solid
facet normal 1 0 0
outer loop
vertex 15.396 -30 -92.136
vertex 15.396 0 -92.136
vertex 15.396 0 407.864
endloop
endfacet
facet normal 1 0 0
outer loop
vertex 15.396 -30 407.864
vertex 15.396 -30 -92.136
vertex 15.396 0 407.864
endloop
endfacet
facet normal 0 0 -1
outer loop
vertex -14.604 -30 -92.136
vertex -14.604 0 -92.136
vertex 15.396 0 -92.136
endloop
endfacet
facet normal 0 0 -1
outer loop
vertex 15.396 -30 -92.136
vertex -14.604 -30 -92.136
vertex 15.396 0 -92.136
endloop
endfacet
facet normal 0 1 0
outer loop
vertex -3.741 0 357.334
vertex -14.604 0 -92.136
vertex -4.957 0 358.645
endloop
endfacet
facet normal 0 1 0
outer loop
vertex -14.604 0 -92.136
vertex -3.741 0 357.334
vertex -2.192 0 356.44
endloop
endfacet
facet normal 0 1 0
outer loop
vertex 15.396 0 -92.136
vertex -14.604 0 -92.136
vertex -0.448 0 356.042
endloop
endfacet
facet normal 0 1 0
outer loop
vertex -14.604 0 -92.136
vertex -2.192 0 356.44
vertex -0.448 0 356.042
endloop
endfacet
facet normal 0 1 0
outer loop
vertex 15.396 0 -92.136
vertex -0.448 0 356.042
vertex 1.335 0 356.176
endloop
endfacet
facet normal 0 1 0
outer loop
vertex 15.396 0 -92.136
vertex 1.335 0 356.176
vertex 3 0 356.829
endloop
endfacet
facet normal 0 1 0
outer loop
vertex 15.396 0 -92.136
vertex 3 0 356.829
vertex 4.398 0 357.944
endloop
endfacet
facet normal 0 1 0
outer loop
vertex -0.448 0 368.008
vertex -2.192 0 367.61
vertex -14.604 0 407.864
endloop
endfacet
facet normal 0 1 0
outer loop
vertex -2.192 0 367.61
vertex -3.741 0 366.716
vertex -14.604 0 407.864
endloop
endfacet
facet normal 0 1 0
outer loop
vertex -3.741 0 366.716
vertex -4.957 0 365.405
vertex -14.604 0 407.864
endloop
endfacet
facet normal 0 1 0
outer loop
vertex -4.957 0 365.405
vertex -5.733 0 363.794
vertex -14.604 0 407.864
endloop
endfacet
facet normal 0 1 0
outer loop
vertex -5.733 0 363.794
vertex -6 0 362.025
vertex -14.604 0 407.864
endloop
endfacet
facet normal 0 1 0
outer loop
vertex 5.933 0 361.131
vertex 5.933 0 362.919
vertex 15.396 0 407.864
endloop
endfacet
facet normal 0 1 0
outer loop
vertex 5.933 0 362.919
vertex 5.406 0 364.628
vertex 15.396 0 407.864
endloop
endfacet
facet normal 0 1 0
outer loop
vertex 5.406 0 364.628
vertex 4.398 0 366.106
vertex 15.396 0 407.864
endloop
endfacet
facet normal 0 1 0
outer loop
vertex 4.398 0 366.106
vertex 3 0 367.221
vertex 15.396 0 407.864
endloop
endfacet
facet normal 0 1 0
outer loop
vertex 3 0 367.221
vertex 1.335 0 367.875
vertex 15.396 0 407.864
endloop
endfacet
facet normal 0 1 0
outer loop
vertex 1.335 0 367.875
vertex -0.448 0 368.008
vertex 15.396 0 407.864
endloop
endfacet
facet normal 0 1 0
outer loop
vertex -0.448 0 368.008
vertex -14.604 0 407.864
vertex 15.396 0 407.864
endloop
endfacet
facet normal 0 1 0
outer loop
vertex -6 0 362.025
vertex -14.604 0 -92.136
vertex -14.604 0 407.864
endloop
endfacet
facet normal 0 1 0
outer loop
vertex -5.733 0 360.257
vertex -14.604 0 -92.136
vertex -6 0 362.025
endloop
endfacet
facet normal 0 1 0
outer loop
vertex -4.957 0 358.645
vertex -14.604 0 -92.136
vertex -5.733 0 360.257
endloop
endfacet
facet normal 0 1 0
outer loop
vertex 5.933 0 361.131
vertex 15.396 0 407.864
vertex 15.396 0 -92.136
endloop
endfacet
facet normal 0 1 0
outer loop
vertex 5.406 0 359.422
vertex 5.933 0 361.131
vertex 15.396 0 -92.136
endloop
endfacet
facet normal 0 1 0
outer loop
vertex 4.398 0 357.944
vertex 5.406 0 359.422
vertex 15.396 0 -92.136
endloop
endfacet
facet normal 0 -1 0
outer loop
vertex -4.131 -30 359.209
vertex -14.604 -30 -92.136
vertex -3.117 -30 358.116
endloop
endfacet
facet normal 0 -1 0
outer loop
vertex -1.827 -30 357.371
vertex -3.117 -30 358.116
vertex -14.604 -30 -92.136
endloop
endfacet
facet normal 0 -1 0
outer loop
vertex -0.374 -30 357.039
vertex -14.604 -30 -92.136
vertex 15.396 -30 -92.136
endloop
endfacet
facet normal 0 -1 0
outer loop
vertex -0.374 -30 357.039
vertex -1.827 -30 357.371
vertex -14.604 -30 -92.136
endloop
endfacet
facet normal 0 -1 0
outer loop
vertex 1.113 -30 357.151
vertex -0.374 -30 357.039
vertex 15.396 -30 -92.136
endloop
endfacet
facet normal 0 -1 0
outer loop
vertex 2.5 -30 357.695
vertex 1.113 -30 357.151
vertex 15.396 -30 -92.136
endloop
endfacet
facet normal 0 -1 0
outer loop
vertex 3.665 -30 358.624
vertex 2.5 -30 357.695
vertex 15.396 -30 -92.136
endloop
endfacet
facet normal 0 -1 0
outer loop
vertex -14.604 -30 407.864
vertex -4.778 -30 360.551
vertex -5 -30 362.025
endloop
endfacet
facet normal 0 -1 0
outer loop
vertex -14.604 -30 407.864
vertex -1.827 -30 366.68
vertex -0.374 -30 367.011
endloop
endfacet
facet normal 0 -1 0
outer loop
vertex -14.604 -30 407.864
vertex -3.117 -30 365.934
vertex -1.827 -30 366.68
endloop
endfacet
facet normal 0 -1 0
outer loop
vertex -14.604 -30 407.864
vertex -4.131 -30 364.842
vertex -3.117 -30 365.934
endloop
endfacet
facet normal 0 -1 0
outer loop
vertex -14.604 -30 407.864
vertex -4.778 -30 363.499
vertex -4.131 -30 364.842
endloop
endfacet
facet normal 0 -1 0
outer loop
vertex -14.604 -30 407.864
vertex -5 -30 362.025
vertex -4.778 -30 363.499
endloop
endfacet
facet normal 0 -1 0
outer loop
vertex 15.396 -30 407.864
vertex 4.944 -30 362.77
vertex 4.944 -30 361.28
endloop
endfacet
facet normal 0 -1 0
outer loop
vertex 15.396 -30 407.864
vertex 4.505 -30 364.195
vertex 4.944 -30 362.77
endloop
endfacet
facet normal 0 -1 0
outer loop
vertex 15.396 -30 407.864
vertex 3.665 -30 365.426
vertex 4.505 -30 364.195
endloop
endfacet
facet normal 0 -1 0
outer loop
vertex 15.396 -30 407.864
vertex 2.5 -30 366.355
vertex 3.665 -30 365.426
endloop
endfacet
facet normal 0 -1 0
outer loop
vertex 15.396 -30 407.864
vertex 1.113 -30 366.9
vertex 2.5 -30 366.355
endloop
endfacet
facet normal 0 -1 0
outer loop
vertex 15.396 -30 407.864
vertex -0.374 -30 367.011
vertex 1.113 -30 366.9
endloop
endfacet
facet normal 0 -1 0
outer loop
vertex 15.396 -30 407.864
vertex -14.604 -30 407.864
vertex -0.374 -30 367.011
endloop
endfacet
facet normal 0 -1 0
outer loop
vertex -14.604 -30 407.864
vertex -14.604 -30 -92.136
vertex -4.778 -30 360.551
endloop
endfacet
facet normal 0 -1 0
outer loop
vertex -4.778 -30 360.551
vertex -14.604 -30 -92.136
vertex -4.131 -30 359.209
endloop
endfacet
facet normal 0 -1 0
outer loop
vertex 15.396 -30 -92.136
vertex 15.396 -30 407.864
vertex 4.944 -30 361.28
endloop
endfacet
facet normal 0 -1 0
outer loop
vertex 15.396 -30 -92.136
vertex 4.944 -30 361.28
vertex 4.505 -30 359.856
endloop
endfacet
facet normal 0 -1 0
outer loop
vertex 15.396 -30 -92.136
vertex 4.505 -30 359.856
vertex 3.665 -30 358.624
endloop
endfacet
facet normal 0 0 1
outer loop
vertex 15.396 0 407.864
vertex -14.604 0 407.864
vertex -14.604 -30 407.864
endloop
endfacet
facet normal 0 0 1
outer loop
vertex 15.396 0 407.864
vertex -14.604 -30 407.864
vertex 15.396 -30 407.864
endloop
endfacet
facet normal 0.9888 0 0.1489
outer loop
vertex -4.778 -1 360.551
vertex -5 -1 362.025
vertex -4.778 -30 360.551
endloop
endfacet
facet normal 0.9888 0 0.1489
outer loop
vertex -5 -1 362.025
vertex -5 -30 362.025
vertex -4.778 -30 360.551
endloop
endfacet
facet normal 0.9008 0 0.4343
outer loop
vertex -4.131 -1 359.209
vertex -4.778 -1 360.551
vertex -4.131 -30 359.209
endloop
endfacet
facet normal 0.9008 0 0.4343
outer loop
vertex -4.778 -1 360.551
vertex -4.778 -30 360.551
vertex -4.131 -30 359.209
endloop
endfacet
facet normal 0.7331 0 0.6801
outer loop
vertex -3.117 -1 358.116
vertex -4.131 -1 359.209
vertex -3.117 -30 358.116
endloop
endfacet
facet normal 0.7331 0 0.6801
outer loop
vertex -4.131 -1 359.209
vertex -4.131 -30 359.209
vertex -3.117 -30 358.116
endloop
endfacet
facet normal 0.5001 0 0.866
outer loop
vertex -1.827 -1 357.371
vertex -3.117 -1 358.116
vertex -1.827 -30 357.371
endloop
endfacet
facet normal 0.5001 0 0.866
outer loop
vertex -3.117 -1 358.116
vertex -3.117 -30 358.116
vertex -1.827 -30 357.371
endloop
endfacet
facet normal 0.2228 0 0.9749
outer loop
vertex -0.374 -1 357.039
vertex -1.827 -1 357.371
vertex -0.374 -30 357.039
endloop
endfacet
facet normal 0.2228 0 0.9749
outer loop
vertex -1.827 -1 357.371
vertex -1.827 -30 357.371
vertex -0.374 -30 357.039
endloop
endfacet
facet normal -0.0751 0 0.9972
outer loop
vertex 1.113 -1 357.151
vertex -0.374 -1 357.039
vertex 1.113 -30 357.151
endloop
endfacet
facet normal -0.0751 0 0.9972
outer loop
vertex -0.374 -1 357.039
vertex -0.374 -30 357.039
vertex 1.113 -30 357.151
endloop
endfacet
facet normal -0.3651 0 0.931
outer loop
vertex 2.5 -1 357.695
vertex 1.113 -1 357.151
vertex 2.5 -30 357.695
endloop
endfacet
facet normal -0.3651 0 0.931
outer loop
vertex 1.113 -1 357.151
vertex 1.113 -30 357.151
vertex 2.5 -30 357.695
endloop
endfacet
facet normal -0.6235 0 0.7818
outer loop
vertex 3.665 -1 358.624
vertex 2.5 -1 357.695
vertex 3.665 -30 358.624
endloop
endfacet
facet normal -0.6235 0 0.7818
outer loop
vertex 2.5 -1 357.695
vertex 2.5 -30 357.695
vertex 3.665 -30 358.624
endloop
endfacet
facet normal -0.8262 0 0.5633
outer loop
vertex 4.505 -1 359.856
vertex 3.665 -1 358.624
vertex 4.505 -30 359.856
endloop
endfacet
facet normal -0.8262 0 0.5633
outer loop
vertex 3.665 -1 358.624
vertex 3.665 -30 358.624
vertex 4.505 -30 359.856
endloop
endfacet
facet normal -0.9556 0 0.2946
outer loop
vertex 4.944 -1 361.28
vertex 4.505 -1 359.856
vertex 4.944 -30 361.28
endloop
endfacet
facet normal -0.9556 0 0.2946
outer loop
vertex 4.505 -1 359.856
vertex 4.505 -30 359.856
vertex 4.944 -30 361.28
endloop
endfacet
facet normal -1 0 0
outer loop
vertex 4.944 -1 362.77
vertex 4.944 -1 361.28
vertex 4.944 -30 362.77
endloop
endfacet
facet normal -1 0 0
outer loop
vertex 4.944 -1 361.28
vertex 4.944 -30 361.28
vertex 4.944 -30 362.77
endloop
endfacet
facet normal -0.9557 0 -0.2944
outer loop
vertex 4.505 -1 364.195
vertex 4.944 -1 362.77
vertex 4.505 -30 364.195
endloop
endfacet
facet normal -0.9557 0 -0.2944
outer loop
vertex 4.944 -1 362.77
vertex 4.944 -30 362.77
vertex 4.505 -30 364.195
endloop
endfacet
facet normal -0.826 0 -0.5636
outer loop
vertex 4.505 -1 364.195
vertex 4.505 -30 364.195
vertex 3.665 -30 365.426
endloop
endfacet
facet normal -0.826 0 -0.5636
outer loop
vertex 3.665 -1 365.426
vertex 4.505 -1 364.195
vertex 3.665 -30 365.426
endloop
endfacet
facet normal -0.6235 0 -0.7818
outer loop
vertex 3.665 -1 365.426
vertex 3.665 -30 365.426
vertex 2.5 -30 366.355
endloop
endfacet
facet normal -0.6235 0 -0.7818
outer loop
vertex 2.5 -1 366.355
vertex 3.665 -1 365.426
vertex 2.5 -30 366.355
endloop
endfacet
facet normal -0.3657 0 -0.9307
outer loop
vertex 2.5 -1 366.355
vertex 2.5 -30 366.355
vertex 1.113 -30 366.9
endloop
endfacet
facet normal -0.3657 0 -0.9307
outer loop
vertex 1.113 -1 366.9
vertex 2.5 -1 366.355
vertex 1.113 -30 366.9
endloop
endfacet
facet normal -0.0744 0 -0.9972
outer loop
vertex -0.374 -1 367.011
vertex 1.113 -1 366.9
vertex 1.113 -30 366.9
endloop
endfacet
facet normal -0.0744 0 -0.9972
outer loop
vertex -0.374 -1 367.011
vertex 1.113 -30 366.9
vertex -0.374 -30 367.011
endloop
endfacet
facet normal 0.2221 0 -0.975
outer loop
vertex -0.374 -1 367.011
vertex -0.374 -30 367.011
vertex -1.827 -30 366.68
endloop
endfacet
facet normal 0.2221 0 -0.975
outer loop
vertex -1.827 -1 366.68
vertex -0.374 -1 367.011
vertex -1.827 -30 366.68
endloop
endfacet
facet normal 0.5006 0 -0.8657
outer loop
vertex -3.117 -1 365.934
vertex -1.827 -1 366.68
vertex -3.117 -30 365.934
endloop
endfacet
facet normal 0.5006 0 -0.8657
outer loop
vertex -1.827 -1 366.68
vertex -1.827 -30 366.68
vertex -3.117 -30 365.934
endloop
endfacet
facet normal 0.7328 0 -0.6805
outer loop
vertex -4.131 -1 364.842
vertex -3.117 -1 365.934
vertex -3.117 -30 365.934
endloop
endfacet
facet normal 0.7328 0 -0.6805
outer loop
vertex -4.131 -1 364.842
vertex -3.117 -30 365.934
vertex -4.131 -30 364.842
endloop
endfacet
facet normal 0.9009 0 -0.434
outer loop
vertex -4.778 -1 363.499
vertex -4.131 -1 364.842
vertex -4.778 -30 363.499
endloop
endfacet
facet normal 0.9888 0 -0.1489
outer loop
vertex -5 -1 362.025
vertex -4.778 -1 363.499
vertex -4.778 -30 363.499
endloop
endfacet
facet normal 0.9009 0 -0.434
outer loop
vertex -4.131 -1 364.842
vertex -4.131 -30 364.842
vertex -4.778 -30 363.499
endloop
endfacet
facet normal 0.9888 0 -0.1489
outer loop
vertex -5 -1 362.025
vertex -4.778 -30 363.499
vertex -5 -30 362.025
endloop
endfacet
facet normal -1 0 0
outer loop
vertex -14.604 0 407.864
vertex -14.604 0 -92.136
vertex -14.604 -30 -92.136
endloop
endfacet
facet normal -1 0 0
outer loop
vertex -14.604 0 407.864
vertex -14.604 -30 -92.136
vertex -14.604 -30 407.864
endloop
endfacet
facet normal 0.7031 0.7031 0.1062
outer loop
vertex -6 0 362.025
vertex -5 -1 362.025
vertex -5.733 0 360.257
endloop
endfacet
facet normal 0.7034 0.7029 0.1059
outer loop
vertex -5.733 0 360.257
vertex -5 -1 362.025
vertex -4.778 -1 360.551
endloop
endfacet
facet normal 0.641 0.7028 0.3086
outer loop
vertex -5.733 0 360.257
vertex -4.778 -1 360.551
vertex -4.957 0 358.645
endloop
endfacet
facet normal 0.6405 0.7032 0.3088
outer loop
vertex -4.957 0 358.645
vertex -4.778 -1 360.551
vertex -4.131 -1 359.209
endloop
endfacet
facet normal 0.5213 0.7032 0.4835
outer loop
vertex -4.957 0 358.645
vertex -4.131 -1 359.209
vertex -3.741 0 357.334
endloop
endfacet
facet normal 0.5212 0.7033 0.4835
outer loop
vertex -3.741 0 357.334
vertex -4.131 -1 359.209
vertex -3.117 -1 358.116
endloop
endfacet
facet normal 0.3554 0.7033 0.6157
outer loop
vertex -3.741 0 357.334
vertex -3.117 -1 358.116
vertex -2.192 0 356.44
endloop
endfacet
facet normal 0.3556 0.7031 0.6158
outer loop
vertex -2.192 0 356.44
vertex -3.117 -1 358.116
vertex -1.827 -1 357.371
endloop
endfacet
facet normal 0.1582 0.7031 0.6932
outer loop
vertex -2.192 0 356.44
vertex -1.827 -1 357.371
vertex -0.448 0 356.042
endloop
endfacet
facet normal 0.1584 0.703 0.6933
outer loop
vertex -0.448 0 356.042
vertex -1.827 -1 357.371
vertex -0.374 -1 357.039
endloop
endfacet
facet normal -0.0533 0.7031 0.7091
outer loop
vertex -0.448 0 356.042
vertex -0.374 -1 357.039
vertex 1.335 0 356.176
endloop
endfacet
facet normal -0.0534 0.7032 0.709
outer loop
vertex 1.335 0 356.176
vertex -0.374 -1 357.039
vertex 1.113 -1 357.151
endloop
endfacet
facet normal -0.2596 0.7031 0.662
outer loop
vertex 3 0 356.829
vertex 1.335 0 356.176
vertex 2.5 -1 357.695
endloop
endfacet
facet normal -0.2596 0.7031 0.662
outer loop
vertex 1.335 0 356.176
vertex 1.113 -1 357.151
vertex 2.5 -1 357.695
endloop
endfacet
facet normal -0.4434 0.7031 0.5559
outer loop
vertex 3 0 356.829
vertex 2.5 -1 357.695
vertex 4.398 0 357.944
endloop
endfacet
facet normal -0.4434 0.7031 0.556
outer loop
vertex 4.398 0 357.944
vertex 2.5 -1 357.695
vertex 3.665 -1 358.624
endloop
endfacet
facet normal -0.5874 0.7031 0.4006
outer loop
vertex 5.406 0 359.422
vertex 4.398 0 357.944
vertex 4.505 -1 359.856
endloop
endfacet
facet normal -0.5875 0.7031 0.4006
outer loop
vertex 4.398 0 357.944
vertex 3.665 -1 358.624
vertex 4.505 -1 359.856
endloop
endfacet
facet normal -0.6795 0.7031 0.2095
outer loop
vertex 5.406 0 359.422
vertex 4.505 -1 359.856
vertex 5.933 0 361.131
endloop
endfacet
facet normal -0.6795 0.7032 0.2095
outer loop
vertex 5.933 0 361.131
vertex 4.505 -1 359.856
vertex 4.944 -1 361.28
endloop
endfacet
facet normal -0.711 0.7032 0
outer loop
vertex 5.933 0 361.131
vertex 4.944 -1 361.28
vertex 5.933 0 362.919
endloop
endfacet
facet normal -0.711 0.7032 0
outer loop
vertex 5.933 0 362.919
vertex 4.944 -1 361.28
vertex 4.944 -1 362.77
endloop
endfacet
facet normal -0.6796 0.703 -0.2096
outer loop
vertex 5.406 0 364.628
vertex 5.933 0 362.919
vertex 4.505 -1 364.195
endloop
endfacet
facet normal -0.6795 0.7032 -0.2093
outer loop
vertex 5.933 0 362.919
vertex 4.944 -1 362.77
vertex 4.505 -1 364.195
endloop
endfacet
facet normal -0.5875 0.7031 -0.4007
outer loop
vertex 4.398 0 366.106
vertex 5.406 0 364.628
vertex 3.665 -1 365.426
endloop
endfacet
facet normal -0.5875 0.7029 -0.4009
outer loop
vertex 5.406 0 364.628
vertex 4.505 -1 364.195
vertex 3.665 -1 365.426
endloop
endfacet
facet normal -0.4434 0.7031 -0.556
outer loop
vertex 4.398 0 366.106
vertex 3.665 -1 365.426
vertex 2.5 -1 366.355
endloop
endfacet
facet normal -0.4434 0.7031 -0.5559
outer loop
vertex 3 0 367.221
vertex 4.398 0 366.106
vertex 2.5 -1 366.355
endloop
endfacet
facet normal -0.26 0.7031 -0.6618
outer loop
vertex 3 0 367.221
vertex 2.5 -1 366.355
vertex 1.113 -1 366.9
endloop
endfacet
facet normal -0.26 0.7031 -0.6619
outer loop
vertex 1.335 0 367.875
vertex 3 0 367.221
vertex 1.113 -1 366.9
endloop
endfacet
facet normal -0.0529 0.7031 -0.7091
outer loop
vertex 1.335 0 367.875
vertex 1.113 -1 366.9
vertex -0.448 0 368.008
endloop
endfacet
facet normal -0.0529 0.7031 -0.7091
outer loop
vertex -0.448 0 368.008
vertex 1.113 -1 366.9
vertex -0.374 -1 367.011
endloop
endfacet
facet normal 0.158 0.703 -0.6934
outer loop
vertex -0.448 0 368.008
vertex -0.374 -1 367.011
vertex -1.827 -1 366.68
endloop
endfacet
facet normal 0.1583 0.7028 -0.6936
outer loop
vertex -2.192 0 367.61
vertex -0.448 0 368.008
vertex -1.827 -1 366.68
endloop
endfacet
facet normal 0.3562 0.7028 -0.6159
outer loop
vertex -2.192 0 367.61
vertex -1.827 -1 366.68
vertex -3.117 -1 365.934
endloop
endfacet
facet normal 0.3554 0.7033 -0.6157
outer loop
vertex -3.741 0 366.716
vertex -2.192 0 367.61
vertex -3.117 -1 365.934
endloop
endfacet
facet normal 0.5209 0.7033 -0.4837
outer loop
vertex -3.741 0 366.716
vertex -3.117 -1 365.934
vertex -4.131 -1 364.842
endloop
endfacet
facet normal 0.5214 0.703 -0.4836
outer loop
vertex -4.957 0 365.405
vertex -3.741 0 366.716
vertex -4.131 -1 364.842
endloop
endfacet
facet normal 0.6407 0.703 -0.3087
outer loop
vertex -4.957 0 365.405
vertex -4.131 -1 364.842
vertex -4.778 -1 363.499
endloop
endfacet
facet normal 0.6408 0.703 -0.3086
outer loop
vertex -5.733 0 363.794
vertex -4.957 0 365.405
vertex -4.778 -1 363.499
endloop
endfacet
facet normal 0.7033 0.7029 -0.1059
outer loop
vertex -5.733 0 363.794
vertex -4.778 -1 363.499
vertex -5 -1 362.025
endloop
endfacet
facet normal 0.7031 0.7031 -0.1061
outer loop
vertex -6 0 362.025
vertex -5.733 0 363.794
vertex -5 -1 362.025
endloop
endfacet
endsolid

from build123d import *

# Parameters (mm, degrees)
F0_W           = 30
F0_H           = 500
F1_DEPTH       = 30
F2_D           = 10
F2_CSINK_D     = 12
F2_CSINK_ANGLE = 90


with BuildPart() as f1:
    # F0 (on Front) → F1 (new body)
    with BuildSketch(Plane.XZ):
        with Locations((0.3963927738, 157.8636374871)):
            Rectangle(F0_W, F0_H)
    extrude(amount=F1_DEPTH)

    # F2 (through all)
    with Locations(Plane(origin=(0, 0, 0), x_dir=(1, 0, 0), z_dir=(0, 1, 0))):
        with Locations((0, -362.025141716)):
            CounterSinkHole(F2_D / 2, F2_CSINK_D / 2, counter_sink_angle=F2_CSINK_ANGLE)


solid = f1.part
